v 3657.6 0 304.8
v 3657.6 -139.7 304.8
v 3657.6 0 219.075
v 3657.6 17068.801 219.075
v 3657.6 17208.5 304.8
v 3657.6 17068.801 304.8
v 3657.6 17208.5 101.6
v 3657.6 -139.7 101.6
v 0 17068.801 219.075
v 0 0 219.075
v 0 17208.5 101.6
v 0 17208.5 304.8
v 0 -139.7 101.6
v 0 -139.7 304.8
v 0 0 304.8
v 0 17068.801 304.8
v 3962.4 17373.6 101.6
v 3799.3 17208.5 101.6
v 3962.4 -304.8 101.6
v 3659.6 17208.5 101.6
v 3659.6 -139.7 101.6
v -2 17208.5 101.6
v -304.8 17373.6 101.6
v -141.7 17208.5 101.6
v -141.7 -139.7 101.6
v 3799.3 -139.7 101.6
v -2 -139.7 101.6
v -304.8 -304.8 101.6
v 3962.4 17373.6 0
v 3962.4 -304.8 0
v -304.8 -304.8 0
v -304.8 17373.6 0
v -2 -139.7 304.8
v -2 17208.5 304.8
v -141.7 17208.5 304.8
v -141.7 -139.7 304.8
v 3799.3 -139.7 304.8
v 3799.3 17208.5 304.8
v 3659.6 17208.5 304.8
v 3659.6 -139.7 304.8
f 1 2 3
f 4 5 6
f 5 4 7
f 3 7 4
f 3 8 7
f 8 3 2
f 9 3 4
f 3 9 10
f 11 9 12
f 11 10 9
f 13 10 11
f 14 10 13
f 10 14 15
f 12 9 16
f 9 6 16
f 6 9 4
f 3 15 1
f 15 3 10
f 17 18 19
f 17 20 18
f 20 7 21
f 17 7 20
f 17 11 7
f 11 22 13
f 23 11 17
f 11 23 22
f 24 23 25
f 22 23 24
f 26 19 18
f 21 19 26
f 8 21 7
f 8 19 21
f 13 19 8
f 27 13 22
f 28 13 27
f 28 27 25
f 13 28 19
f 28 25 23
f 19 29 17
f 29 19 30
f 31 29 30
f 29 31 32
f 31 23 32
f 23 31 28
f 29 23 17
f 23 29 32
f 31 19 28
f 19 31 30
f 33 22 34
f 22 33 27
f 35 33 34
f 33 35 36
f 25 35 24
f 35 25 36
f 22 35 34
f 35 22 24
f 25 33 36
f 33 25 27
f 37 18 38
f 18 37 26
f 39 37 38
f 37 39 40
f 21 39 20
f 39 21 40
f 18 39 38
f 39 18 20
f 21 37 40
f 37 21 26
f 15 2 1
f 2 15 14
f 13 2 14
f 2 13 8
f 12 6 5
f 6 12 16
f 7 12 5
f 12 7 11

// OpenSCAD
/* by Jason Luther */

FOOT = 304.8;
INCH = 25.4;
CUBIC_YARD = 764554858;
BOARD_FOOT = FOOT * FOOT * INCH;

width = 12 * FOOT;
length = 56 * FOOT;

primary_surface_depth = 4 * INCH;
oyster_shell_depth = 1/2 * INCH;
leveling_layer_depth = 0 * INCH;
weed_barrier_depth = 1/8 * INCH;
drainage_layer_depth = 4 * INCH;
drainage_layer_border =  12 * INCH;

drainage_layer_above = 0;
weed_barrier_above = drainage_layer_depth + drainage_layer_above;
leveling_layer_above = weed_barrier_depth + weed_barrier_above;
oyster_shell_above = leveling_layer_depth + leveling_layer_above;
primary_surface_above = oyster_shell_depth + oyster_shell_above;

module court_cube(depth, height, name) {
  echo(
    name, width / FOOT, "ft x ", length / FOOT, "ft x ",
    depth / INCH, "in = ", width * length * depth / CUBIC_YARD, "cu. yd."
  );

  translate([0, 0, height])
    cube([width, length, depth]);
}

module primary_surface() {
  color("WhiteSmoke")
    court_cube(primary_surface_depth, primary_surface_above, "Primary Surface");
}

module oyster_shell() {
  color("Gainsboro")
    court_cube(oyster_shell_depth, oyster_shell_above, "Oyster Shell");
}

module leveling_layer() {
  color("Tan")
    court_cube(leveling_layer_depth, leveling_layer_above, "Leveling Layer");
}

module weed_barrier() {
  color("Black")
    court_cube(weed_barrier_depth, weed_barrier_above, "Weed Barrier");
}

module drainage_layer() {
  drainage_layer_width = width + 2 * drainage_layer_border;
  drainage_layer_length = length + 2 * drainage_layer_border;
  drainage_layer_volume = drainage_layer_length * drainage_layer_width * drainage_layer_depth;
  echo(
  	"Drainage layer: ", drainage_layer_width / FOOT, "ft x ", drainage_layer_length / FOOT, "ft x ",
    drainage_layer_depth / INCH, "in = ", drainage_layer_volume / CUBIC_YARD, "cu. yd."
  );

  color("SlateGray")
    translate([-drainage_layer_border, -drainage_layer_border, drainage_layer_above])
      cube([width + 2 * drainage_layer_border, length + 2 * drainage_layer_border, drainage_layer_depth]);
}

module court_layers() {
primary_surface();
oyster_shell();
leveling_layer();
weed_barrier();
drainage_layer();
}

module cross_section() {
  translate([-1 * width, -2 * FOOT - 1, -1 * FOOT])
      cube([1.2 * width, 6 * FOOT, 4 * FOOT]);

}
difference() {
  union() {
    court_layers();
    border();
  };
  //cross_section();
}

module board(w, h, l, name) {
  echo(
    name, w / INCH, "in x ", h / INCH, "in x ",
    l / INCH, "in = ", (w * h * l) / BOARD_FOOT, "board feet"
  );

  color("Peru")
    cube([w, l, h]);
}

border_width = 5.5 * INCH;
border_height = 11 * INCH;
border_grade = 1 * INCH;

module border() {
translate([-border_width - 2, -border_width, border_grade])
  board(border_width, border_height, length + 2 * border_width, "Side Frame");
translate([width + 2, -border_width,  border_grade])
  board(border_width, border_height, length + 2 * border_width, "Side Frame");
translate([0, -border_width,  border_grade])
  board(width, border_height, border_width, "End Frame");
translate([0, length,  border_grade])
  board(width, border_height, border_width, "End Frame");

bf_sides = 2 * (length + 2 * border_width) * border_height * border_width / BOARD_FOOT;
bf_ends = 2 * (width) * border_height * border_width / BOARD_FOOT;
bf_total = bf_sides + bf_ends;
echo("Border board feet: ", bf_total, "board feet");
linear = 4 * (length + 2 * border_width) + 4 * (width);
lf = linear / FOOT;
echo("Linear feet with 2 courses: ", lf, "linear feet");
}
